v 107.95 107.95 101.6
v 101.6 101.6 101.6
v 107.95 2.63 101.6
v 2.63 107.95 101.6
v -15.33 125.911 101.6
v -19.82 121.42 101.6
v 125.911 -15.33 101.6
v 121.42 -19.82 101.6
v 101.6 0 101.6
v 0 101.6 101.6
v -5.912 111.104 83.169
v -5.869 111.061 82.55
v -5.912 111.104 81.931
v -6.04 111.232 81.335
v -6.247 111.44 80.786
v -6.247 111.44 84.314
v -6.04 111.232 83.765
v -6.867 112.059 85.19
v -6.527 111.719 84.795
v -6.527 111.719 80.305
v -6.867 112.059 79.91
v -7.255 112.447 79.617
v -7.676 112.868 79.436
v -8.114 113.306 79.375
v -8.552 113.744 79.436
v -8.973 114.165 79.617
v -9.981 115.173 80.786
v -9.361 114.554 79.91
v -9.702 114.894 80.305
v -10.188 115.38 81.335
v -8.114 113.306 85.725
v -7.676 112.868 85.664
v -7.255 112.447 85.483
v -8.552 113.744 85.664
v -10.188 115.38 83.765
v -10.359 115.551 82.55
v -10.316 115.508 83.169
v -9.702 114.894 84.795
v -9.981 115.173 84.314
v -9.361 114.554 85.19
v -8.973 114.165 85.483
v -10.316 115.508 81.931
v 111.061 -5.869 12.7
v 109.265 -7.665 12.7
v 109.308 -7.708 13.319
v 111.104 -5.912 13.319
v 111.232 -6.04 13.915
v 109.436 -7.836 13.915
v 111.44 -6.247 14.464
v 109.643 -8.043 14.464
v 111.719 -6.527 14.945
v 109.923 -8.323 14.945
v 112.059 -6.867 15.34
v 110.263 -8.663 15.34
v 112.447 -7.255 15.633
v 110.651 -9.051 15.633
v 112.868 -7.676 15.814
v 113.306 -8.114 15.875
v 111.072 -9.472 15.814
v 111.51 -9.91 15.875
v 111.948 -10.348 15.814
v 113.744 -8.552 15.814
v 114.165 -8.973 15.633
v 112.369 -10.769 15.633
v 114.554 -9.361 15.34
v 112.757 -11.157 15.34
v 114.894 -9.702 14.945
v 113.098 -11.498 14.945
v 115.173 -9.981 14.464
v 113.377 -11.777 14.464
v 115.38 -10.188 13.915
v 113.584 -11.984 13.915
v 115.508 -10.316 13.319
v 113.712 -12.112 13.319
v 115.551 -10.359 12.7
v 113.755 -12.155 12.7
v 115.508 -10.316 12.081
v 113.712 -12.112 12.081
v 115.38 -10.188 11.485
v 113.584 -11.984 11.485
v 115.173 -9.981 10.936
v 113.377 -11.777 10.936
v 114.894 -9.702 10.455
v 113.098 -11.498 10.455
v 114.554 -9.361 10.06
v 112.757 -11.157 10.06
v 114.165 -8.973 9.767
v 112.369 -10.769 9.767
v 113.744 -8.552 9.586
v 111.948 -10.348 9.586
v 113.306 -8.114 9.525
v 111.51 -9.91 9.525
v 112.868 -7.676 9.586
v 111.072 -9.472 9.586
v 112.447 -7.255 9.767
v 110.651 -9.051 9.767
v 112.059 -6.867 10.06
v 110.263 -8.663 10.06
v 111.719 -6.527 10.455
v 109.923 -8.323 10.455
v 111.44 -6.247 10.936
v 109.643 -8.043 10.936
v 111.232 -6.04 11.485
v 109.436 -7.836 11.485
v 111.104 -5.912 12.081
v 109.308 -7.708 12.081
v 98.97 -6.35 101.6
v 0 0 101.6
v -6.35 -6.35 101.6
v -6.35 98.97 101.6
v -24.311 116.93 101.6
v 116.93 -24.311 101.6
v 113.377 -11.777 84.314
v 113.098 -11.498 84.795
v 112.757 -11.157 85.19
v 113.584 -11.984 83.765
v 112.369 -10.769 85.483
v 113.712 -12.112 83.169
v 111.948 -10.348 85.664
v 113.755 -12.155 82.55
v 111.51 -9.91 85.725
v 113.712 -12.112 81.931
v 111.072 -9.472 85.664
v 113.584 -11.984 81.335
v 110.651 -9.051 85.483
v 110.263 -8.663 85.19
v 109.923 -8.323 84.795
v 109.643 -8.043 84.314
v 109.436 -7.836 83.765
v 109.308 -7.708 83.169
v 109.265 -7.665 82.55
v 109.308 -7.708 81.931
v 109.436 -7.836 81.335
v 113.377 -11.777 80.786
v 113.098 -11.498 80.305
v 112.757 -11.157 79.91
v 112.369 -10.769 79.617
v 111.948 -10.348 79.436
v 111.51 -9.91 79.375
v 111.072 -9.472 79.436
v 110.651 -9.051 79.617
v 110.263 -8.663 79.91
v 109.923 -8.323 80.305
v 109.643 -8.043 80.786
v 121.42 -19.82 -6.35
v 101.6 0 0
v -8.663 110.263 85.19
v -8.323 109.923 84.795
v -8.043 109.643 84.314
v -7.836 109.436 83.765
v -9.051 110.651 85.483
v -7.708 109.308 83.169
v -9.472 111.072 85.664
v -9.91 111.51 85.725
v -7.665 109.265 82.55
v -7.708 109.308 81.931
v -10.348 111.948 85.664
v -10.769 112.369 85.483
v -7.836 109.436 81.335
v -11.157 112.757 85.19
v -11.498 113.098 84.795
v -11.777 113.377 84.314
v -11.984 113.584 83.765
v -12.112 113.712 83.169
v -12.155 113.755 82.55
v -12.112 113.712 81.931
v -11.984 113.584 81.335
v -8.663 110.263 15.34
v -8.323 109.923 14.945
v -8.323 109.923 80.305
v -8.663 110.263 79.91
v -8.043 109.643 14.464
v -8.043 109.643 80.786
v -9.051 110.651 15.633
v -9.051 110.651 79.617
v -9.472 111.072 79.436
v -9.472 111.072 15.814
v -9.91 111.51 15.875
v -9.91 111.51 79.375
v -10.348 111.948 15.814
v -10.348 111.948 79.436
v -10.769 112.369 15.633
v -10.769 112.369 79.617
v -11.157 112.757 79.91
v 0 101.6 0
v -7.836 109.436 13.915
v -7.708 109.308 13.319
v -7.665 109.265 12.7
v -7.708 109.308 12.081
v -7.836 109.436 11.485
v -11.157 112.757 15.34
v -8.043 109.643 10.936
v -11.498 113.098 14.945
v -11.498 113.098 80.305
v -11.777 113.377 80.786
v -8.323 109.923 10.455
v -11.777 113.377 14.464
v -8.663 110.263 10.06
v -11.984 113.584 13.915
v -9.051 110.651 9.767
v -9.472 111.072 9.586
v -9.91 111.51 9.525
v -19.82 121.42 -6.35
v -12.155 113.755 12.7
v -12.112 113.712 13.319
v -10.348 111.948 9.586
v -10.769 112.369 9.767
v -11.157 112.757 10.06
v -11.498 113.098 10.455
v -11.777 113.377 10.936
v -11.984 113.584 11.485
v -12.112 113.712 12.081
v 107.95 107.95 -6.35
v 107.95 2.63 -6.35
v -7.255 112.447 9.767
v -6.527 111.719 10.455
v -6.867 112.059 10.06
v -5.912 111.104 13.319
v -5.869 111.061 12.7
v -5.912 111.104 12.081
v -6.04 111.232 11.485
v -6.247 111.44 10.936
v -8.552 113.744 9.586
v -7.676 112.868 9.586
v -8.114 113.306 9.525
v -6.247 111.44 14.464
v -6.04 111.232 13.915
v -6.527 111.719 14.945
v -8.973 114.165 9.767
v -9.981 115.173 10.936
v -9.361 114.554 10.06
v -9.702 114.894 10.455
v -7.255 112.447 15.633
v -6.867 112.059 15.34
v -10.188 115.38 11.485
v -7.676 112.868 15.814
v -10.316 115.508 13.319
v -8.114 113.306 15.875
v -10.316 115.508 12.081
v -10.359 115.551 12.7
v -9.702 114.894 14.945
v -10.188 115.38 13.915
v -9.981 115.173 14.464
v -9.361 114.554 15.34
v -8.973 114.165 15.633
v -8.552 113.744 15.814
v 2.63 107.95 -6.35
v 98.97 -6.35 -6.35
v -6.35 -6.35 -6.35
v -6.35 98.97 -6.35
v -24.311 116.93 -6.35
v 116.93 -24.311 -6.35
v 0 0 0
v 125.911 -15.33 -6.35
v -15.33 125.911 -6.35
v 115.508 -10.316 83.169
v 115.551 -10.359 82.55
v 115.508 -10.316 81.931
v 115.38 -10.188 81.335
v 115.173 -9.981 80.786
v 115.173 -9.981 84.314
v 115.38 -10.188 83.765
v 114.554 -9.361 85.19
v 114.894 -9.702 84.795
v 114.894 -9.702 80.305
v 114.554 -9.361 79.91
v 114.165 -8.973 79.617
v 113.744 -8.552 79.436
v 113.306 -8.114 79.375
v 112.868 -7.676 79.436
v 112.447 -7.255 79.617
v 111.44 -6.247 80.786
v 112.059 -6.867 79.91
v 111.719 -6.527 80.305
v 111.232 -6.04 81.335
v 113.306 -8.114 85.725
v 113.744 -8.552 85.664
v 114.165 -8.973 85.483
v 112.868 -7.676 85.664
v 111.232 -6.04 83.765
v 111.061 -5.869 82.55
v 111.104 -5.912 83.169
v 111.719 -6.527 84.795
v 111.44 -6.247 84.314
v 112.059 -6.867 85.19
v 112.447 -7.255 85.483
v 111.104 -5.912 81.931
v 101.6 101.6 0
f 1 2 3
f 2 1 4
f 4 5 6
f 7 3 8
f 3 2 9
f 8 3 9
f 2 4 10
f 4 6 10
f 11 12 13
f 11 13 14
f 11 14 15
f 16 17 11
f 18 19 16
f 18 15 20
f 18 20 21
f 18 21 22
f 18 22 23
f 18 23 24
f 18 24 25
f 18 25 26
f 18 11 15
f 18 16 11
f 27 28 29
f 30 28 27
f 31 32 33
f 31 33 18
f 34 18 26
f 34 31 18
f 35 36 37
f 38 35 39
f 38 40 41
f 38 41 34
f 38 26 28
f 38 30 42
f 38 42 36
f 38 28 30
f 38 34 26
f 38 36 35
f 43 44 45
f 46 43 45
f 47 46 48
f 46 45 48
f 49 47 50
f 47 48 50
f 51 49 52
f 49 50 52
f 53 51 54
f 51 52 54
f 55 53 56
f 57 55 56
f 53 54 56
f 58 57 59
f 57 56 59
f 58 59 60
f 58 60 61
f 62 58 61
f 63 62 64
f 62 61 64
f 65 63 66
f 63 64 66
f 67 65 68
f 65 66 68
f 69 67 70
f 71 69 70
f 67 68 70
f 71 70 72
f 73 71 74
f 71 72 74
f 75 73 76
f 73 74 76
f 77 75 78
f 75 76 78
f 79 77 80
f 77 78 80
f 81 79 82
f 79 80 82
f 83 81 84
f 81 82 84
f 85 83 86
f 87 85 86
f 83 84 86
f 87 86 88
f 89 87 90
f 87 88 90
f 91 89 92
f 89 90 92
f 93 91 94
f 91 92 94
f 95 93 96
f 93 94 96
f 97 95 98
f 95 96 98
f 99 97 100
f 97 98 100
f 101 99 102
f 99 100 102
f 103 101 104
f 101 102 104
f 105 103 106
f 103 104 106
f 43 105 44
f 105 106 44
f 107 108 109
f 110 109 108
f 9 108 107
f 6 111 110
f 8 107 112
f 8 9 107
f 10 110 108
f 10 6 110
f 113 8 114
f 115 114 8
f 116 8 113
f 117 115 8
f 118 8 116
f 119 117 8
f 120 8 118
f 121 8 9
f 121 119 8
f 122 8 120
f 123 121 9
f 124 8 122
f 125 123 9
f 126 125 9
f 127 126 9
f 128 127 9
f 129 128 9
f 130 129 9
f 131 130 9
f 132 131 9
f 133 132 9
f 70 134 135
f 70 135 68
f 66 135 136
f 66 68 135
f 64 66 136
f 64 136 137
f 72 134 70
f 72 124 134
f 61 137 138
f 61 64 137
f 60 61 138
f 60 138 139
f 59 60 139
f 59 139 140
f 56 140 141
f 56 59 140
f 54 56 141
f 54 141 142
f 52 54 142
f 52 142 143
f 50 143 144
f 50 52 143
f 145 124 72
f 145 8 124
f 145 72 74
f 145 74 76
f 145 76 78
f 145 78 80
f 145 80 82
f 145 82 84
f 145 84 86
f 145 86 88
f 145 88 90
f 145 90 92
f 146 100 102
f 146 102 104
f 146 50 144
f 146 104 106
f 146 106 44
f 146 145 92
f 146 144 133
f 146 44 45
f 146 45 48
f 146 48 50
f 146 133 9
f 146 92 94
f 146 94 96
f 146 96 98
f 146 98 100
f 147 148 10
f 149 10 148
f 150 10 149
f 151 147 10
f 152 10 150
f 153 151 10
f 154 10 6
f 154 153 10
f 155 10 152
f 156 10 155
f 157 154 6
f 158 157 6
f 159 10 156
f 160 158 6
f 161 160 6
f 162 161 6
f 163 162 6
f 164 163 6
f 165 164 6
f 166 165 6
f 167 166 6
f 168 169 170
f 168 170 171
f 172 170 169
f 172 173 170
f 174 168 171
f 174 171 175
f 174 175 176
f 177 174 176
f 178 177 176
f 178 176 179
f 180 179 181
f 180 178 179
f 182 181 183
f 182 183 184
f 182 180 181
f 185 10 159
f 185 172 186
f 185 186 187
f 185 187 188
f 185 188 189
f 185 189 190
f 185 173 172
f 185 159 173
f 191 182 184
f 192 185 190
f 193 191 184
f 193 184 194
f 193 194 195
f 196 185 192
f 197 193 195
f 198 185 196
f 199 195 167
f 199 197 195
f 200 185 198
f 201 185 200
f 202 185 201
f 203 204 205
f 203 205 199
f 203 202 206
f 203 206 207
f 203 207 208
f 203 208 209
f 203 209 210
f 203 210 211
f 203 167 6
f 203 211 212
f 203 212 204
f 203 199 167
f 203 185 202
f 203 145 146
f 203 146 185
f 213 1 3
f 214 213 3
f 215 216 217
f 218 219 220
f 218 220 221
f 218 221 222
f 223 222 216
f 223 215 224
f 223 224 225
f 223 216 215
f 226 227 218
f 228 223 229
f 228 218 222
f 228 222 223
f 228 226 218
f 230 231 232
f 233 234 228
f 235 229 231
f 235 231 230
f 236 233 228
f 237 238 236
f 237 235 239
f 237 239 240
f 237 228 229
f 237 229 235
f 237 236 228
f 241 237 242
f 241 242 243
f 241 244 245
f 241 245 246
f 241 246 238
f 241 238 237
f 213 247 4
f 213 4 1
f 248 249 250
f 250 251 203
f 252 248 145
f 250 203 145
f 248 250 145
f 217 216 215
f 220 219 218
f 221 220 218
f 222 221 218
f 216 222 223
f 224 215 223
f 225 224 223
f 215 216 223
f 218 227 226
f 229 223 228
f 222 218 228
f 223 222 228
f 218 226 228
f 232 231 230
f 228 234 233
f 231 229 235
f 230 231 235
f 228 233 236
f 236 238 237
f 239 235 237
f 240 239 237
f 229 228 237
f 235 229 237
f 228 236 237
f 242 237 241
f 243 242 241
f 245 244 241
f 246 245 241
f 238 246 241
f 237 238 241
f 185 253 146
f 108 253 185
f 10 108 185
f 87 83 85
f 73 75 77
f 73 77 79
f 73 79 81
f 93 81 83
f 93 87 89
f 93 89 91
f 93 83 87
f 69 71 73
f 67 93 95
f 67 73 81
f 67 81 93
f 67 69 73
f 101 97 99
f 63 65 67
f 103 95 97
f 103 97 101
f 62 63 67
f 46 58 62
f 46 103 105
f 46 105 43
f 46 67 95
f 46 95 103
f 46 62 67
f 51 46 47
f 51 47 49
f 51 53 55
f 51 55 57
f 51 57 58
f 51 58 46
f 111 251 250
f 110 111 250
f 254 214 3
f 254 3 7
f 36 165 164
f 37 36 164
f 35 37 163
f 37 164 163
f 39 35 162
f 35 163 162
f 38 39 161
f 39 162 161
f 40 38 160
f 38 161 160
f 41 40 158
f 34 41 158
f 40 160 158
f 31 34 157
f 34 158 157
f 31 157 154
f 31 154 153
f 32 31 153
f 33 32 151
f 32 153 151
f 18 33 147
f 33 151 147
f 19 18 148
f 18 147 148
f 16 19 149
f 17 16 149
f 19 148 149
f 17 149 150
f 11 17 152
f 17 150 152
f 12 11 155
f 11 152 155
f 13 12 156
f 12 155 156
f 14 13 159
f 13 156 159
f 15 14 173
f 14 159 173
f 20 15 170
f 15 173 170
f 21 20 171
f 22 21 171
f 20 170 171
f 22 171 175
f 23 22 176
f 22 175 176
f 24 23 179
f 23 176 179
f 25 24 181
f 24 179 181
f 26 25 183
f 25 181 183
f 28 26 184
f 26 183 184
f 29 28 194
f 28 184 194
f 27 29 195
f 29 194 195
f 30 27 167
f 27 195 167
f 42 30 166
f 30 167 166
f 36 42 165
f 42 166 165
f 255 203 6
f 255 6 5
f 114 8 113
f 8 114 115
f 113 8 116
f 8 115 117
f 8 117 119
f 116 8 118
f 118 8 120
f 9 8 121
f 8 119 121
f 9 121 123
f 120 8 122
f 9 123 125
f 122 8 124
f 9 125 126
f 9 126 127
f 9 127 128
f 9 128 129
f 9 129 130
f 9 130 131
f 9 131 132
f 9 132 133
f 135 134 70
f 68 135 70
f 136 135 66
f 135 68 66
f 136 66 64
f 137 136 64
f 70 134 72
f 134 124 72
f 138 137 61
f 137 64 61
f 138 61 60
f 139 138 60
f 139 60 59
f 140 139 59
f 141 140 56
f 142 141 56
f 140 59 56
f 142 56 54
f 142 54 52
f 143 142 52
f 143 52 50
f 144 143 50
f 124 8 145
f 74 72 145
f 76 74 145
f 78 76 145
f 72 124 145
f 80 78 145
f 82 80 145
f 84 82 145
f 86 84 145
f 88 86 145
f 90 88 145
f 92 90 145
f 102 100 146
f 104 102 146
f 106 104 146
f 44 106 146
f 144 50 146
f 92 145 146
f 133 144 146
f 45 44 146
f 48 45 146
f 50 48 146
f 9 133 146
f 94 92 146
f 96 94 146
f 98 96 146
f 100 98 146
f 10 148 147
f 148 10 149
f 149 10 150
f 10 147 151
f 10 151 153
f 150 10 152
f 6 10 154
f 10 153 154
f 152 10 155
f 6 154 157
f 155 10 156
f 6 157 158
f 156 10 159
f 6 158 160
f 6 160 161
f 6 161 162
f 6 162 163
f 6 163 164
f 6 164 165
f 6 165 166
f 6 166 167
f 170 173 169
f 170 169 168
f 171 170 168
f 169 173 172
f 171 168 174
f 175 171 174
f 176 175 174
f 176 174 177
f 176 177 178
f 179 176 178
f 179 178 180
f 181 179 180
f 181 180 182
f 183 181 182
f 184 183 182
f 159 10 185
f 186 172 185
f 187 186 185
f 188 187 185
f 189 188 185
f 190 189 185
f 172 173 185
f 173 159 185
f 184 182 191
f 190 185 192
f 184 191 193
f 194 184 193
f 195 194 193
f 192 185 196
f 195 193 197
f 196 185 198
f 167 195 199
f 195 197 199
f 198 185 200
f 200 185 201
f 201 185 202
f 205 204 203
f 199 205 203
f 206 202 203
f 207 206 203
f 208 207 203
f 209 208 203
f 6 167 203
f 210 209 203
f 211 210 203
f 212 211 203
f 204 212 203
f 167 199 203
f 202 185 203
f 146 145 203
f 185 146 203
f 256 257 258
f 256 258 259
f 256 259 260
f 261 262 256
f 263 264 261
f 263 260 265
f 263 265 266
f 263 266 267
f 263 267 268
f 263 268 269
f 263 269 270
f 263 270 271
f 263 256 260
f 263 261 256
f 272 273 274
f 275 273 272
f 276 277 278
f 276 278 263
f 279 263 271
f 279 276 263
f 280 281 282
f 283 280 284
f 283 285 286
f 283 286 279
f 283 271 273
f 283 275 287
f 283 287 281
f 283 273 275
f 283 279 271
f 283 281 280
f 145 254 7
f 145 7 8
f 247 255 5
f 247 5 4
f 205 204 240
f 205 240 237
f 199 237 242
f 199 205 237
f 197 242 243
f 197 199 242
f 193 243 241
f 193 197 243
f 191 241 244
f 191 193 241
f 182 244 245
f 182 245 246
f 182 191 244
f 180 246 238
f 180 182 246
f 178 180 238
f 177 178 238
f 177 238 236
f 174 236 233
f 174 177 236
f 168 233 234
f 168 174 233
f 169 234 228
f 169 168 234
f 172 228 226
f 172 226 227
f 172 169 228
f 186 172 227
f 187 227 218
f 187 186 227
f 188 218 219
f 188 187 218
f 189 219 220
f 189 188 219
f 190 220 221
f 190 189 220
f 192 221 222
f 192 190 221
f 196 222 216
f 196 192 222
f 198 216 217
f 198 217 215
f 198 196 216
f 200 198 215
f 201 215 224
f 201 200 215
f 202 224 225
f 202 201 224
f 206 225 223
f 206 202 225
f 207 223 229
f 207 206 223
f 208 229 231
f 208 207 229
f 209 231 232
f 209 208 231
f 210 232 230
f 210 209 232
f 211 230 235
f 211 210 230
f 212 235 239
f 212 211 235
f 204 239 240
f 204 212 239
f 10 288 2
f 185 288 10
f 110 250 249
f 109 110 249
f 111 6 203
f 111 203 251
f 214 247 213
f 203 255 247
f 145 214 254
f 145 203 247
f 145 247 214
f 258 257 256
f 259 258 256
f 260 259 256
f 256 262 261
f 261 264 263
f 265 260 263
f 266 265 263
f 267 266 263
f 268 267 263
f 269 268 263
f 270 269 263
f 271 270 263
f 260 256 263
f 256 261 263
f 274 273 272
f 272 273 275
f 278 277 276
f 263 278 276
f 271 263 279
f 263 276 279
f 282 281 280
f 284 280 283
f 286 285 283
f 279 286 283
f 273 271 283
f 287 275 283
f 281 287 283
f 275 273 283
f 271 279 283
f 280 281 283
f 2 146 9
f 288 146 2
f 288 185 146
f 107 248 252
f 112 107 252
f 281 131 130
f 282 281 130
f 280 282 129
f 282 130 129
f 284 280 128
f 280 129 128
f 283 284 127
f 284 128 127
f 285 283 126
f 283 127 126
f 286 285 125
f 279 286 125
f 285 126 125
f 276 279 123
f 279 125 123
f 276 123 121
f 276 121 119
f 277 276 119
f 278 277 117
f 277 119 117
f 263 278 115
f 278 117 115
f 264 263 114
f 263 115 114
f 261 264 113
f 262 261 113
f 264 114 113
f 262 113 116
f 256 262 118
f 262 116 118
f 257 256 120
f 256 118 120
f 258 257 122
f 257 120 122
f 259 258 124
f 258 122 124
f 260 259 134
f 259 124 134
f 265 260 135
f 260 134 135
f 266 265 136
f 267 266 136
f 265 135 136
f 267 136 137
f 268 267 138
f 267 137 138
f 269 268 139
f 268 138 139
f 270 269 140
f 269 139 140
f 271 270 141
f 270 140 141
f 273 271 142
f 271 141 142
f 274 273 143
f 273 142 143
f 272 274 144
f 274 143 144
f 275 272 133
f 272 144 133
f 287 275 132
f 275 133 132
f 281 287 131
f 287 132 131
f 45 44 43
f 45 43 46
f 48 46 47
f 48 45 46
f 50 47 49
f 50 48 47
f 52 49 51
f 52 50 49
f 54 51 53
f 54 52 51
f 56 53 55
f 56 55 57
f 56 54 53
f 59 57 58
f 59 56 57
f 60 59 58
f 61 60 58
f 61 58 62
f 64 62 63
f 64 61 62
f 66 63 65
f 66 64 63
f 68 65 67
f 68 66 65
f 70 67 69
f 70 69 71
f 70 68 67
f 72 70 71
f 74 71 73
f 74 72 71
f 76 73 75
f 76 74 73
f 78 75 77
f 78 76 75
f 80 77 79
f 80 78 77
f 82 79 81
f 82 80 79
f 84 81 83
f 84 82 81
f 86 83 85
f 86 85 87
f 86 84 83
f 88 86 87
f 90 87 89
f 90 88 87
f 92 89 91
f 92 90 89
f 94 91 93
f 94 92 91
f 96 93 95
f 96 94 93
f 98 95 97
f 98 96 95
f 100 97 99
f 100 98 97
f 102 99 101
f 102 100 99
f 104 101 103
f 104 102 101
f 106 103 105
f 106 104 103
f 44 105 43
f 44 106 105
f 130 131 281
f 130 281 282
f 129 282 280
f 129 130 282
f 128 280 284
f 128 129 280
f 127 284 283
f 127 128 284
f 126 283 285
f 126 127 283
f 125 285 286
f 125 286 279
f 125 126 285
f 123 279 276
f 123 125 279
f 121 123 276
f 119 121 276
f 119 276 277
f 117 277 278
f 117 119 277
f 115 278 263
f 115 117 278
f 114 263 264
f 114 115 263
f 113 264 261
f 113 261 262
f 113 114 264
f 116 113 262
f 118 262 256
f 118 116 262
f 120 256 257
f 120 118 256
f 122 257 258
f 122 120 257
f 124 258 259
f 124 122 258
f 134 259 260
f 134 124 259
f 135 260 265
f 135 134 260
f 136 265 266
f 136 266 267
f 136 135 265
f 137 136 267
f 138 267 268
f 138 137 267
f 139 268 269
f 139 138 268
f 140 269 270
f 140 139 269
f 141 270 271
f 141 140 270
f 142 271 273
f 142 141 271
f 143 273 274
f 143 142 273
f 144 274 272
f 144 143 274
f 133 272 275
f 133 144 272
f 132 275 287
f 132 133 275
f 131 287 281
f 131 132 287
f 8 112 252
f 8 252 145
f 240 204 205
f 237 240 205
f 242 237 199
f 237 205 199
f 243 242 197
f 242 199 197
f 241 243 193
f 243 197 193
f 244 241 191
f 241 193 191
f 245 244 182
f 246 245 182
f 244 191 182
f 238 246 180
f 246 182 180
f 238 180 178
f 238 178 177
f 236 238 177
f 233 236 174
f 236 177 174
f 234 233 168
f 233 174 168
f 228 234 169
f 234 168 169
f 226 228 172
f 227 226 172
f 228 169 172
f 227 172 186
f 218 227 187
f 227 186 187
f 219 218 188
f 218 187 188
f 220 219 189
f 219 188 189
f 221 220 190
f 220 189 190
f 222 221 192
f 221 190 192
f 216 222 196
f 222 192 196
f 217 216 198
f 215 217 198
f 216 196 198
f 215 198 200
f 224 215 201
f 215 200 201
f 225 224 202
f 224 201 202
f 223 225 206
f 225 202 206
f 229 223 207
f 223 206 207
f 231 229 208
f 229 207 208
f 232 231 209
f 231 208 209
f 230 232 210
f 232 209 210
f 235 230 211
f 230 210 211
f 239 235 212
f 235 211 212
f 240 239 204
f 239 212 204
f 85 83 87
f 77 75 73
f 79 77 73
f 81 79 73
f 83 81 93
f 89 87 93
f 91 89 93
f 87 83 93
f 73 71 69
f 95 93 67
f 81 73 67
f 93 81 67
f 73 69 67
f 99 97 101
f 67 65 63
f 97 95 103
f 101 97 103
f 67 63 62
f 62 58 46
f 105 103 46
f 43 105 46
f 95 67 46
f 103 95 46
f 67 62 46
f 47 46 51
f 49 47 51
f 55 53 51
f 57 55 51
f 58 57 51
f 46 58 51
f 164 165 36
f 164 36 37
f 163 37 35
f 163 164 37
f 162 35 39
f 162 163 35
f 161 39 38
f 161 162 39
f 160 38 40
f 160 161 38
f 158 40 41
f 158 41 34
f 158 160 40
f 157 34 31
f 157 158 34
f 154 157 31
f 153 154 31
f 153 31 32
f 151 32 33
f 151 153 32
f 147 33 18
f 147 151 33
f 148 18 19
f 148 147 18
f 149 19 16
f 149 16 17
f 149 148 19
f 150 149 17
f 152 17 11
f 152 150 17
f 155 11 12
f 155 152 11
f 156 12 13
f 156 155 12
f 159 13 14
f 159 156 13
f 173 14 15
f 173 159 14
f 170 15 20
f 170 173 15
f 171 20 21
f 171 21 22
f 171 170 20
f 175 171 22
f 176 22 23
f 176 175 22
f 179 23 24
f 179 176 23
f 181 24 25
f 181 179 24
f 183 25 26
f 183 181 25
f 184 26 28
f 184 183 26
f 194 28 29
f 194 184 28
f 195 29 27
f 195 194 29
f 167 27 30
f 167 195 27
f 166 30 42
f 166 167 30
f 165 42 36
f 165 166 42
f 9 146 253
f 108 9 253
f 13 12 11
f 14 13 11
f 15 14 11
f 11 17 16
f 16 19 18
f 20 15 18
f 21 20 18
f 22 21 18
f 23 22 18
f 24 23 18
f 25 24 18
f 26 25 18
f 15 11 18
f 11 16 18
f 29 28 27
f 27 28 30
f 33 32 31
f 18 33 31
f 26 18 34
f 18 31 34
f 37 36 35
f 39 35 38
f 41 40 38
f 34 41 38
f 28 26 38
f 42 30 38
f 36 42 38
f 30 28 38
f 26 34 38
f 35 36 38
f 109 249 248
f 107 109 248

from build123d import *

# Parameters (mm, degrees)
F4_DEPTH = 6.35
F5_DEPTH = 107.95
F8_R     = 3.175
F9_DEPTH = 2.54


with BuildPart() as f4:
    # F3 (on offset) → F4 (new body)
    with BuildSketch(Plane.XY.offset(-6.35)):
        Polygon((0, 101.6), (0, 0), (101.6, 0), align=None)
        Polygon((101.6, 0), (0, 0), (0, 101.6), (-6.35, 107.95), (-19.8203841816, 121.4203841816), (-24.3105122421, 116.9302561211), (-6.35, 98.9697438789), (-6.35, -6.35), (98.9697438789, -6.35), (116.9302561211, -24.3105122421), (121.4203841816, -19.8203841816), (107.95, -6.35), align=None)
    extrude(amount=F4_DEPTH)


with BuildPart() as f5:
    # F3 (on offset) → F5 (new body)
    with BuildSketch(Plane.XY.offset(-6.35)):
        Polygon((101.6, 0), (0, 0), (0, 101.6), (-6.35, 107.95), (-19.8203841816, 121.4203841816), (-24.3105122421, 116.9302561211), (-6.35, 98.9697438789), (-6.35, -6.35), (98.9697438789, -6.35), (116.9302561211, -24.3105122421), (121.4203841816, -19.8203841816), (107.95, -6.35), align=None)
    extrude(amount=F5_DEPTH)

    # F6: union F4
    add(f4.part)

    # F8 (on plane+point) → F9 (join)
    with BuildSketch(Plane(origin=(50.8, 50.8, 0), x_dir=(-0.7071067812, 0.7071067812, 0), z_dir=(0.7071067812, 0.7071067812, 0))):
        with Locations((85.8571770291, 82.55)):
            Circle(F8_R)
        with Locations((85.8571770291, 12.7)):
            Circle(F8_R)
        with Locations((-85.8571770291, 82.55)):
            Circle(F8_R)
        with Locations((-85.8571770291, 12.7)):
            Circle(F8_R)
    extrude(amount=F9_DEPTH)


with BuildPart() as f10_1:
    # F10: instance of F5
    add(f5.part.mirror(Plane(origin=(50.8, 50.8, 40.9695181501), x_dir=(-0.7071067812, 0.7071067812, 0), z_dir=(0.7071067812, 0.7071067812, 0))))

    # F11: cut F5
    add(f5.part, mode=Mode.SUBTRACT)


solid = Compound([f5.part, f10_1.part])
